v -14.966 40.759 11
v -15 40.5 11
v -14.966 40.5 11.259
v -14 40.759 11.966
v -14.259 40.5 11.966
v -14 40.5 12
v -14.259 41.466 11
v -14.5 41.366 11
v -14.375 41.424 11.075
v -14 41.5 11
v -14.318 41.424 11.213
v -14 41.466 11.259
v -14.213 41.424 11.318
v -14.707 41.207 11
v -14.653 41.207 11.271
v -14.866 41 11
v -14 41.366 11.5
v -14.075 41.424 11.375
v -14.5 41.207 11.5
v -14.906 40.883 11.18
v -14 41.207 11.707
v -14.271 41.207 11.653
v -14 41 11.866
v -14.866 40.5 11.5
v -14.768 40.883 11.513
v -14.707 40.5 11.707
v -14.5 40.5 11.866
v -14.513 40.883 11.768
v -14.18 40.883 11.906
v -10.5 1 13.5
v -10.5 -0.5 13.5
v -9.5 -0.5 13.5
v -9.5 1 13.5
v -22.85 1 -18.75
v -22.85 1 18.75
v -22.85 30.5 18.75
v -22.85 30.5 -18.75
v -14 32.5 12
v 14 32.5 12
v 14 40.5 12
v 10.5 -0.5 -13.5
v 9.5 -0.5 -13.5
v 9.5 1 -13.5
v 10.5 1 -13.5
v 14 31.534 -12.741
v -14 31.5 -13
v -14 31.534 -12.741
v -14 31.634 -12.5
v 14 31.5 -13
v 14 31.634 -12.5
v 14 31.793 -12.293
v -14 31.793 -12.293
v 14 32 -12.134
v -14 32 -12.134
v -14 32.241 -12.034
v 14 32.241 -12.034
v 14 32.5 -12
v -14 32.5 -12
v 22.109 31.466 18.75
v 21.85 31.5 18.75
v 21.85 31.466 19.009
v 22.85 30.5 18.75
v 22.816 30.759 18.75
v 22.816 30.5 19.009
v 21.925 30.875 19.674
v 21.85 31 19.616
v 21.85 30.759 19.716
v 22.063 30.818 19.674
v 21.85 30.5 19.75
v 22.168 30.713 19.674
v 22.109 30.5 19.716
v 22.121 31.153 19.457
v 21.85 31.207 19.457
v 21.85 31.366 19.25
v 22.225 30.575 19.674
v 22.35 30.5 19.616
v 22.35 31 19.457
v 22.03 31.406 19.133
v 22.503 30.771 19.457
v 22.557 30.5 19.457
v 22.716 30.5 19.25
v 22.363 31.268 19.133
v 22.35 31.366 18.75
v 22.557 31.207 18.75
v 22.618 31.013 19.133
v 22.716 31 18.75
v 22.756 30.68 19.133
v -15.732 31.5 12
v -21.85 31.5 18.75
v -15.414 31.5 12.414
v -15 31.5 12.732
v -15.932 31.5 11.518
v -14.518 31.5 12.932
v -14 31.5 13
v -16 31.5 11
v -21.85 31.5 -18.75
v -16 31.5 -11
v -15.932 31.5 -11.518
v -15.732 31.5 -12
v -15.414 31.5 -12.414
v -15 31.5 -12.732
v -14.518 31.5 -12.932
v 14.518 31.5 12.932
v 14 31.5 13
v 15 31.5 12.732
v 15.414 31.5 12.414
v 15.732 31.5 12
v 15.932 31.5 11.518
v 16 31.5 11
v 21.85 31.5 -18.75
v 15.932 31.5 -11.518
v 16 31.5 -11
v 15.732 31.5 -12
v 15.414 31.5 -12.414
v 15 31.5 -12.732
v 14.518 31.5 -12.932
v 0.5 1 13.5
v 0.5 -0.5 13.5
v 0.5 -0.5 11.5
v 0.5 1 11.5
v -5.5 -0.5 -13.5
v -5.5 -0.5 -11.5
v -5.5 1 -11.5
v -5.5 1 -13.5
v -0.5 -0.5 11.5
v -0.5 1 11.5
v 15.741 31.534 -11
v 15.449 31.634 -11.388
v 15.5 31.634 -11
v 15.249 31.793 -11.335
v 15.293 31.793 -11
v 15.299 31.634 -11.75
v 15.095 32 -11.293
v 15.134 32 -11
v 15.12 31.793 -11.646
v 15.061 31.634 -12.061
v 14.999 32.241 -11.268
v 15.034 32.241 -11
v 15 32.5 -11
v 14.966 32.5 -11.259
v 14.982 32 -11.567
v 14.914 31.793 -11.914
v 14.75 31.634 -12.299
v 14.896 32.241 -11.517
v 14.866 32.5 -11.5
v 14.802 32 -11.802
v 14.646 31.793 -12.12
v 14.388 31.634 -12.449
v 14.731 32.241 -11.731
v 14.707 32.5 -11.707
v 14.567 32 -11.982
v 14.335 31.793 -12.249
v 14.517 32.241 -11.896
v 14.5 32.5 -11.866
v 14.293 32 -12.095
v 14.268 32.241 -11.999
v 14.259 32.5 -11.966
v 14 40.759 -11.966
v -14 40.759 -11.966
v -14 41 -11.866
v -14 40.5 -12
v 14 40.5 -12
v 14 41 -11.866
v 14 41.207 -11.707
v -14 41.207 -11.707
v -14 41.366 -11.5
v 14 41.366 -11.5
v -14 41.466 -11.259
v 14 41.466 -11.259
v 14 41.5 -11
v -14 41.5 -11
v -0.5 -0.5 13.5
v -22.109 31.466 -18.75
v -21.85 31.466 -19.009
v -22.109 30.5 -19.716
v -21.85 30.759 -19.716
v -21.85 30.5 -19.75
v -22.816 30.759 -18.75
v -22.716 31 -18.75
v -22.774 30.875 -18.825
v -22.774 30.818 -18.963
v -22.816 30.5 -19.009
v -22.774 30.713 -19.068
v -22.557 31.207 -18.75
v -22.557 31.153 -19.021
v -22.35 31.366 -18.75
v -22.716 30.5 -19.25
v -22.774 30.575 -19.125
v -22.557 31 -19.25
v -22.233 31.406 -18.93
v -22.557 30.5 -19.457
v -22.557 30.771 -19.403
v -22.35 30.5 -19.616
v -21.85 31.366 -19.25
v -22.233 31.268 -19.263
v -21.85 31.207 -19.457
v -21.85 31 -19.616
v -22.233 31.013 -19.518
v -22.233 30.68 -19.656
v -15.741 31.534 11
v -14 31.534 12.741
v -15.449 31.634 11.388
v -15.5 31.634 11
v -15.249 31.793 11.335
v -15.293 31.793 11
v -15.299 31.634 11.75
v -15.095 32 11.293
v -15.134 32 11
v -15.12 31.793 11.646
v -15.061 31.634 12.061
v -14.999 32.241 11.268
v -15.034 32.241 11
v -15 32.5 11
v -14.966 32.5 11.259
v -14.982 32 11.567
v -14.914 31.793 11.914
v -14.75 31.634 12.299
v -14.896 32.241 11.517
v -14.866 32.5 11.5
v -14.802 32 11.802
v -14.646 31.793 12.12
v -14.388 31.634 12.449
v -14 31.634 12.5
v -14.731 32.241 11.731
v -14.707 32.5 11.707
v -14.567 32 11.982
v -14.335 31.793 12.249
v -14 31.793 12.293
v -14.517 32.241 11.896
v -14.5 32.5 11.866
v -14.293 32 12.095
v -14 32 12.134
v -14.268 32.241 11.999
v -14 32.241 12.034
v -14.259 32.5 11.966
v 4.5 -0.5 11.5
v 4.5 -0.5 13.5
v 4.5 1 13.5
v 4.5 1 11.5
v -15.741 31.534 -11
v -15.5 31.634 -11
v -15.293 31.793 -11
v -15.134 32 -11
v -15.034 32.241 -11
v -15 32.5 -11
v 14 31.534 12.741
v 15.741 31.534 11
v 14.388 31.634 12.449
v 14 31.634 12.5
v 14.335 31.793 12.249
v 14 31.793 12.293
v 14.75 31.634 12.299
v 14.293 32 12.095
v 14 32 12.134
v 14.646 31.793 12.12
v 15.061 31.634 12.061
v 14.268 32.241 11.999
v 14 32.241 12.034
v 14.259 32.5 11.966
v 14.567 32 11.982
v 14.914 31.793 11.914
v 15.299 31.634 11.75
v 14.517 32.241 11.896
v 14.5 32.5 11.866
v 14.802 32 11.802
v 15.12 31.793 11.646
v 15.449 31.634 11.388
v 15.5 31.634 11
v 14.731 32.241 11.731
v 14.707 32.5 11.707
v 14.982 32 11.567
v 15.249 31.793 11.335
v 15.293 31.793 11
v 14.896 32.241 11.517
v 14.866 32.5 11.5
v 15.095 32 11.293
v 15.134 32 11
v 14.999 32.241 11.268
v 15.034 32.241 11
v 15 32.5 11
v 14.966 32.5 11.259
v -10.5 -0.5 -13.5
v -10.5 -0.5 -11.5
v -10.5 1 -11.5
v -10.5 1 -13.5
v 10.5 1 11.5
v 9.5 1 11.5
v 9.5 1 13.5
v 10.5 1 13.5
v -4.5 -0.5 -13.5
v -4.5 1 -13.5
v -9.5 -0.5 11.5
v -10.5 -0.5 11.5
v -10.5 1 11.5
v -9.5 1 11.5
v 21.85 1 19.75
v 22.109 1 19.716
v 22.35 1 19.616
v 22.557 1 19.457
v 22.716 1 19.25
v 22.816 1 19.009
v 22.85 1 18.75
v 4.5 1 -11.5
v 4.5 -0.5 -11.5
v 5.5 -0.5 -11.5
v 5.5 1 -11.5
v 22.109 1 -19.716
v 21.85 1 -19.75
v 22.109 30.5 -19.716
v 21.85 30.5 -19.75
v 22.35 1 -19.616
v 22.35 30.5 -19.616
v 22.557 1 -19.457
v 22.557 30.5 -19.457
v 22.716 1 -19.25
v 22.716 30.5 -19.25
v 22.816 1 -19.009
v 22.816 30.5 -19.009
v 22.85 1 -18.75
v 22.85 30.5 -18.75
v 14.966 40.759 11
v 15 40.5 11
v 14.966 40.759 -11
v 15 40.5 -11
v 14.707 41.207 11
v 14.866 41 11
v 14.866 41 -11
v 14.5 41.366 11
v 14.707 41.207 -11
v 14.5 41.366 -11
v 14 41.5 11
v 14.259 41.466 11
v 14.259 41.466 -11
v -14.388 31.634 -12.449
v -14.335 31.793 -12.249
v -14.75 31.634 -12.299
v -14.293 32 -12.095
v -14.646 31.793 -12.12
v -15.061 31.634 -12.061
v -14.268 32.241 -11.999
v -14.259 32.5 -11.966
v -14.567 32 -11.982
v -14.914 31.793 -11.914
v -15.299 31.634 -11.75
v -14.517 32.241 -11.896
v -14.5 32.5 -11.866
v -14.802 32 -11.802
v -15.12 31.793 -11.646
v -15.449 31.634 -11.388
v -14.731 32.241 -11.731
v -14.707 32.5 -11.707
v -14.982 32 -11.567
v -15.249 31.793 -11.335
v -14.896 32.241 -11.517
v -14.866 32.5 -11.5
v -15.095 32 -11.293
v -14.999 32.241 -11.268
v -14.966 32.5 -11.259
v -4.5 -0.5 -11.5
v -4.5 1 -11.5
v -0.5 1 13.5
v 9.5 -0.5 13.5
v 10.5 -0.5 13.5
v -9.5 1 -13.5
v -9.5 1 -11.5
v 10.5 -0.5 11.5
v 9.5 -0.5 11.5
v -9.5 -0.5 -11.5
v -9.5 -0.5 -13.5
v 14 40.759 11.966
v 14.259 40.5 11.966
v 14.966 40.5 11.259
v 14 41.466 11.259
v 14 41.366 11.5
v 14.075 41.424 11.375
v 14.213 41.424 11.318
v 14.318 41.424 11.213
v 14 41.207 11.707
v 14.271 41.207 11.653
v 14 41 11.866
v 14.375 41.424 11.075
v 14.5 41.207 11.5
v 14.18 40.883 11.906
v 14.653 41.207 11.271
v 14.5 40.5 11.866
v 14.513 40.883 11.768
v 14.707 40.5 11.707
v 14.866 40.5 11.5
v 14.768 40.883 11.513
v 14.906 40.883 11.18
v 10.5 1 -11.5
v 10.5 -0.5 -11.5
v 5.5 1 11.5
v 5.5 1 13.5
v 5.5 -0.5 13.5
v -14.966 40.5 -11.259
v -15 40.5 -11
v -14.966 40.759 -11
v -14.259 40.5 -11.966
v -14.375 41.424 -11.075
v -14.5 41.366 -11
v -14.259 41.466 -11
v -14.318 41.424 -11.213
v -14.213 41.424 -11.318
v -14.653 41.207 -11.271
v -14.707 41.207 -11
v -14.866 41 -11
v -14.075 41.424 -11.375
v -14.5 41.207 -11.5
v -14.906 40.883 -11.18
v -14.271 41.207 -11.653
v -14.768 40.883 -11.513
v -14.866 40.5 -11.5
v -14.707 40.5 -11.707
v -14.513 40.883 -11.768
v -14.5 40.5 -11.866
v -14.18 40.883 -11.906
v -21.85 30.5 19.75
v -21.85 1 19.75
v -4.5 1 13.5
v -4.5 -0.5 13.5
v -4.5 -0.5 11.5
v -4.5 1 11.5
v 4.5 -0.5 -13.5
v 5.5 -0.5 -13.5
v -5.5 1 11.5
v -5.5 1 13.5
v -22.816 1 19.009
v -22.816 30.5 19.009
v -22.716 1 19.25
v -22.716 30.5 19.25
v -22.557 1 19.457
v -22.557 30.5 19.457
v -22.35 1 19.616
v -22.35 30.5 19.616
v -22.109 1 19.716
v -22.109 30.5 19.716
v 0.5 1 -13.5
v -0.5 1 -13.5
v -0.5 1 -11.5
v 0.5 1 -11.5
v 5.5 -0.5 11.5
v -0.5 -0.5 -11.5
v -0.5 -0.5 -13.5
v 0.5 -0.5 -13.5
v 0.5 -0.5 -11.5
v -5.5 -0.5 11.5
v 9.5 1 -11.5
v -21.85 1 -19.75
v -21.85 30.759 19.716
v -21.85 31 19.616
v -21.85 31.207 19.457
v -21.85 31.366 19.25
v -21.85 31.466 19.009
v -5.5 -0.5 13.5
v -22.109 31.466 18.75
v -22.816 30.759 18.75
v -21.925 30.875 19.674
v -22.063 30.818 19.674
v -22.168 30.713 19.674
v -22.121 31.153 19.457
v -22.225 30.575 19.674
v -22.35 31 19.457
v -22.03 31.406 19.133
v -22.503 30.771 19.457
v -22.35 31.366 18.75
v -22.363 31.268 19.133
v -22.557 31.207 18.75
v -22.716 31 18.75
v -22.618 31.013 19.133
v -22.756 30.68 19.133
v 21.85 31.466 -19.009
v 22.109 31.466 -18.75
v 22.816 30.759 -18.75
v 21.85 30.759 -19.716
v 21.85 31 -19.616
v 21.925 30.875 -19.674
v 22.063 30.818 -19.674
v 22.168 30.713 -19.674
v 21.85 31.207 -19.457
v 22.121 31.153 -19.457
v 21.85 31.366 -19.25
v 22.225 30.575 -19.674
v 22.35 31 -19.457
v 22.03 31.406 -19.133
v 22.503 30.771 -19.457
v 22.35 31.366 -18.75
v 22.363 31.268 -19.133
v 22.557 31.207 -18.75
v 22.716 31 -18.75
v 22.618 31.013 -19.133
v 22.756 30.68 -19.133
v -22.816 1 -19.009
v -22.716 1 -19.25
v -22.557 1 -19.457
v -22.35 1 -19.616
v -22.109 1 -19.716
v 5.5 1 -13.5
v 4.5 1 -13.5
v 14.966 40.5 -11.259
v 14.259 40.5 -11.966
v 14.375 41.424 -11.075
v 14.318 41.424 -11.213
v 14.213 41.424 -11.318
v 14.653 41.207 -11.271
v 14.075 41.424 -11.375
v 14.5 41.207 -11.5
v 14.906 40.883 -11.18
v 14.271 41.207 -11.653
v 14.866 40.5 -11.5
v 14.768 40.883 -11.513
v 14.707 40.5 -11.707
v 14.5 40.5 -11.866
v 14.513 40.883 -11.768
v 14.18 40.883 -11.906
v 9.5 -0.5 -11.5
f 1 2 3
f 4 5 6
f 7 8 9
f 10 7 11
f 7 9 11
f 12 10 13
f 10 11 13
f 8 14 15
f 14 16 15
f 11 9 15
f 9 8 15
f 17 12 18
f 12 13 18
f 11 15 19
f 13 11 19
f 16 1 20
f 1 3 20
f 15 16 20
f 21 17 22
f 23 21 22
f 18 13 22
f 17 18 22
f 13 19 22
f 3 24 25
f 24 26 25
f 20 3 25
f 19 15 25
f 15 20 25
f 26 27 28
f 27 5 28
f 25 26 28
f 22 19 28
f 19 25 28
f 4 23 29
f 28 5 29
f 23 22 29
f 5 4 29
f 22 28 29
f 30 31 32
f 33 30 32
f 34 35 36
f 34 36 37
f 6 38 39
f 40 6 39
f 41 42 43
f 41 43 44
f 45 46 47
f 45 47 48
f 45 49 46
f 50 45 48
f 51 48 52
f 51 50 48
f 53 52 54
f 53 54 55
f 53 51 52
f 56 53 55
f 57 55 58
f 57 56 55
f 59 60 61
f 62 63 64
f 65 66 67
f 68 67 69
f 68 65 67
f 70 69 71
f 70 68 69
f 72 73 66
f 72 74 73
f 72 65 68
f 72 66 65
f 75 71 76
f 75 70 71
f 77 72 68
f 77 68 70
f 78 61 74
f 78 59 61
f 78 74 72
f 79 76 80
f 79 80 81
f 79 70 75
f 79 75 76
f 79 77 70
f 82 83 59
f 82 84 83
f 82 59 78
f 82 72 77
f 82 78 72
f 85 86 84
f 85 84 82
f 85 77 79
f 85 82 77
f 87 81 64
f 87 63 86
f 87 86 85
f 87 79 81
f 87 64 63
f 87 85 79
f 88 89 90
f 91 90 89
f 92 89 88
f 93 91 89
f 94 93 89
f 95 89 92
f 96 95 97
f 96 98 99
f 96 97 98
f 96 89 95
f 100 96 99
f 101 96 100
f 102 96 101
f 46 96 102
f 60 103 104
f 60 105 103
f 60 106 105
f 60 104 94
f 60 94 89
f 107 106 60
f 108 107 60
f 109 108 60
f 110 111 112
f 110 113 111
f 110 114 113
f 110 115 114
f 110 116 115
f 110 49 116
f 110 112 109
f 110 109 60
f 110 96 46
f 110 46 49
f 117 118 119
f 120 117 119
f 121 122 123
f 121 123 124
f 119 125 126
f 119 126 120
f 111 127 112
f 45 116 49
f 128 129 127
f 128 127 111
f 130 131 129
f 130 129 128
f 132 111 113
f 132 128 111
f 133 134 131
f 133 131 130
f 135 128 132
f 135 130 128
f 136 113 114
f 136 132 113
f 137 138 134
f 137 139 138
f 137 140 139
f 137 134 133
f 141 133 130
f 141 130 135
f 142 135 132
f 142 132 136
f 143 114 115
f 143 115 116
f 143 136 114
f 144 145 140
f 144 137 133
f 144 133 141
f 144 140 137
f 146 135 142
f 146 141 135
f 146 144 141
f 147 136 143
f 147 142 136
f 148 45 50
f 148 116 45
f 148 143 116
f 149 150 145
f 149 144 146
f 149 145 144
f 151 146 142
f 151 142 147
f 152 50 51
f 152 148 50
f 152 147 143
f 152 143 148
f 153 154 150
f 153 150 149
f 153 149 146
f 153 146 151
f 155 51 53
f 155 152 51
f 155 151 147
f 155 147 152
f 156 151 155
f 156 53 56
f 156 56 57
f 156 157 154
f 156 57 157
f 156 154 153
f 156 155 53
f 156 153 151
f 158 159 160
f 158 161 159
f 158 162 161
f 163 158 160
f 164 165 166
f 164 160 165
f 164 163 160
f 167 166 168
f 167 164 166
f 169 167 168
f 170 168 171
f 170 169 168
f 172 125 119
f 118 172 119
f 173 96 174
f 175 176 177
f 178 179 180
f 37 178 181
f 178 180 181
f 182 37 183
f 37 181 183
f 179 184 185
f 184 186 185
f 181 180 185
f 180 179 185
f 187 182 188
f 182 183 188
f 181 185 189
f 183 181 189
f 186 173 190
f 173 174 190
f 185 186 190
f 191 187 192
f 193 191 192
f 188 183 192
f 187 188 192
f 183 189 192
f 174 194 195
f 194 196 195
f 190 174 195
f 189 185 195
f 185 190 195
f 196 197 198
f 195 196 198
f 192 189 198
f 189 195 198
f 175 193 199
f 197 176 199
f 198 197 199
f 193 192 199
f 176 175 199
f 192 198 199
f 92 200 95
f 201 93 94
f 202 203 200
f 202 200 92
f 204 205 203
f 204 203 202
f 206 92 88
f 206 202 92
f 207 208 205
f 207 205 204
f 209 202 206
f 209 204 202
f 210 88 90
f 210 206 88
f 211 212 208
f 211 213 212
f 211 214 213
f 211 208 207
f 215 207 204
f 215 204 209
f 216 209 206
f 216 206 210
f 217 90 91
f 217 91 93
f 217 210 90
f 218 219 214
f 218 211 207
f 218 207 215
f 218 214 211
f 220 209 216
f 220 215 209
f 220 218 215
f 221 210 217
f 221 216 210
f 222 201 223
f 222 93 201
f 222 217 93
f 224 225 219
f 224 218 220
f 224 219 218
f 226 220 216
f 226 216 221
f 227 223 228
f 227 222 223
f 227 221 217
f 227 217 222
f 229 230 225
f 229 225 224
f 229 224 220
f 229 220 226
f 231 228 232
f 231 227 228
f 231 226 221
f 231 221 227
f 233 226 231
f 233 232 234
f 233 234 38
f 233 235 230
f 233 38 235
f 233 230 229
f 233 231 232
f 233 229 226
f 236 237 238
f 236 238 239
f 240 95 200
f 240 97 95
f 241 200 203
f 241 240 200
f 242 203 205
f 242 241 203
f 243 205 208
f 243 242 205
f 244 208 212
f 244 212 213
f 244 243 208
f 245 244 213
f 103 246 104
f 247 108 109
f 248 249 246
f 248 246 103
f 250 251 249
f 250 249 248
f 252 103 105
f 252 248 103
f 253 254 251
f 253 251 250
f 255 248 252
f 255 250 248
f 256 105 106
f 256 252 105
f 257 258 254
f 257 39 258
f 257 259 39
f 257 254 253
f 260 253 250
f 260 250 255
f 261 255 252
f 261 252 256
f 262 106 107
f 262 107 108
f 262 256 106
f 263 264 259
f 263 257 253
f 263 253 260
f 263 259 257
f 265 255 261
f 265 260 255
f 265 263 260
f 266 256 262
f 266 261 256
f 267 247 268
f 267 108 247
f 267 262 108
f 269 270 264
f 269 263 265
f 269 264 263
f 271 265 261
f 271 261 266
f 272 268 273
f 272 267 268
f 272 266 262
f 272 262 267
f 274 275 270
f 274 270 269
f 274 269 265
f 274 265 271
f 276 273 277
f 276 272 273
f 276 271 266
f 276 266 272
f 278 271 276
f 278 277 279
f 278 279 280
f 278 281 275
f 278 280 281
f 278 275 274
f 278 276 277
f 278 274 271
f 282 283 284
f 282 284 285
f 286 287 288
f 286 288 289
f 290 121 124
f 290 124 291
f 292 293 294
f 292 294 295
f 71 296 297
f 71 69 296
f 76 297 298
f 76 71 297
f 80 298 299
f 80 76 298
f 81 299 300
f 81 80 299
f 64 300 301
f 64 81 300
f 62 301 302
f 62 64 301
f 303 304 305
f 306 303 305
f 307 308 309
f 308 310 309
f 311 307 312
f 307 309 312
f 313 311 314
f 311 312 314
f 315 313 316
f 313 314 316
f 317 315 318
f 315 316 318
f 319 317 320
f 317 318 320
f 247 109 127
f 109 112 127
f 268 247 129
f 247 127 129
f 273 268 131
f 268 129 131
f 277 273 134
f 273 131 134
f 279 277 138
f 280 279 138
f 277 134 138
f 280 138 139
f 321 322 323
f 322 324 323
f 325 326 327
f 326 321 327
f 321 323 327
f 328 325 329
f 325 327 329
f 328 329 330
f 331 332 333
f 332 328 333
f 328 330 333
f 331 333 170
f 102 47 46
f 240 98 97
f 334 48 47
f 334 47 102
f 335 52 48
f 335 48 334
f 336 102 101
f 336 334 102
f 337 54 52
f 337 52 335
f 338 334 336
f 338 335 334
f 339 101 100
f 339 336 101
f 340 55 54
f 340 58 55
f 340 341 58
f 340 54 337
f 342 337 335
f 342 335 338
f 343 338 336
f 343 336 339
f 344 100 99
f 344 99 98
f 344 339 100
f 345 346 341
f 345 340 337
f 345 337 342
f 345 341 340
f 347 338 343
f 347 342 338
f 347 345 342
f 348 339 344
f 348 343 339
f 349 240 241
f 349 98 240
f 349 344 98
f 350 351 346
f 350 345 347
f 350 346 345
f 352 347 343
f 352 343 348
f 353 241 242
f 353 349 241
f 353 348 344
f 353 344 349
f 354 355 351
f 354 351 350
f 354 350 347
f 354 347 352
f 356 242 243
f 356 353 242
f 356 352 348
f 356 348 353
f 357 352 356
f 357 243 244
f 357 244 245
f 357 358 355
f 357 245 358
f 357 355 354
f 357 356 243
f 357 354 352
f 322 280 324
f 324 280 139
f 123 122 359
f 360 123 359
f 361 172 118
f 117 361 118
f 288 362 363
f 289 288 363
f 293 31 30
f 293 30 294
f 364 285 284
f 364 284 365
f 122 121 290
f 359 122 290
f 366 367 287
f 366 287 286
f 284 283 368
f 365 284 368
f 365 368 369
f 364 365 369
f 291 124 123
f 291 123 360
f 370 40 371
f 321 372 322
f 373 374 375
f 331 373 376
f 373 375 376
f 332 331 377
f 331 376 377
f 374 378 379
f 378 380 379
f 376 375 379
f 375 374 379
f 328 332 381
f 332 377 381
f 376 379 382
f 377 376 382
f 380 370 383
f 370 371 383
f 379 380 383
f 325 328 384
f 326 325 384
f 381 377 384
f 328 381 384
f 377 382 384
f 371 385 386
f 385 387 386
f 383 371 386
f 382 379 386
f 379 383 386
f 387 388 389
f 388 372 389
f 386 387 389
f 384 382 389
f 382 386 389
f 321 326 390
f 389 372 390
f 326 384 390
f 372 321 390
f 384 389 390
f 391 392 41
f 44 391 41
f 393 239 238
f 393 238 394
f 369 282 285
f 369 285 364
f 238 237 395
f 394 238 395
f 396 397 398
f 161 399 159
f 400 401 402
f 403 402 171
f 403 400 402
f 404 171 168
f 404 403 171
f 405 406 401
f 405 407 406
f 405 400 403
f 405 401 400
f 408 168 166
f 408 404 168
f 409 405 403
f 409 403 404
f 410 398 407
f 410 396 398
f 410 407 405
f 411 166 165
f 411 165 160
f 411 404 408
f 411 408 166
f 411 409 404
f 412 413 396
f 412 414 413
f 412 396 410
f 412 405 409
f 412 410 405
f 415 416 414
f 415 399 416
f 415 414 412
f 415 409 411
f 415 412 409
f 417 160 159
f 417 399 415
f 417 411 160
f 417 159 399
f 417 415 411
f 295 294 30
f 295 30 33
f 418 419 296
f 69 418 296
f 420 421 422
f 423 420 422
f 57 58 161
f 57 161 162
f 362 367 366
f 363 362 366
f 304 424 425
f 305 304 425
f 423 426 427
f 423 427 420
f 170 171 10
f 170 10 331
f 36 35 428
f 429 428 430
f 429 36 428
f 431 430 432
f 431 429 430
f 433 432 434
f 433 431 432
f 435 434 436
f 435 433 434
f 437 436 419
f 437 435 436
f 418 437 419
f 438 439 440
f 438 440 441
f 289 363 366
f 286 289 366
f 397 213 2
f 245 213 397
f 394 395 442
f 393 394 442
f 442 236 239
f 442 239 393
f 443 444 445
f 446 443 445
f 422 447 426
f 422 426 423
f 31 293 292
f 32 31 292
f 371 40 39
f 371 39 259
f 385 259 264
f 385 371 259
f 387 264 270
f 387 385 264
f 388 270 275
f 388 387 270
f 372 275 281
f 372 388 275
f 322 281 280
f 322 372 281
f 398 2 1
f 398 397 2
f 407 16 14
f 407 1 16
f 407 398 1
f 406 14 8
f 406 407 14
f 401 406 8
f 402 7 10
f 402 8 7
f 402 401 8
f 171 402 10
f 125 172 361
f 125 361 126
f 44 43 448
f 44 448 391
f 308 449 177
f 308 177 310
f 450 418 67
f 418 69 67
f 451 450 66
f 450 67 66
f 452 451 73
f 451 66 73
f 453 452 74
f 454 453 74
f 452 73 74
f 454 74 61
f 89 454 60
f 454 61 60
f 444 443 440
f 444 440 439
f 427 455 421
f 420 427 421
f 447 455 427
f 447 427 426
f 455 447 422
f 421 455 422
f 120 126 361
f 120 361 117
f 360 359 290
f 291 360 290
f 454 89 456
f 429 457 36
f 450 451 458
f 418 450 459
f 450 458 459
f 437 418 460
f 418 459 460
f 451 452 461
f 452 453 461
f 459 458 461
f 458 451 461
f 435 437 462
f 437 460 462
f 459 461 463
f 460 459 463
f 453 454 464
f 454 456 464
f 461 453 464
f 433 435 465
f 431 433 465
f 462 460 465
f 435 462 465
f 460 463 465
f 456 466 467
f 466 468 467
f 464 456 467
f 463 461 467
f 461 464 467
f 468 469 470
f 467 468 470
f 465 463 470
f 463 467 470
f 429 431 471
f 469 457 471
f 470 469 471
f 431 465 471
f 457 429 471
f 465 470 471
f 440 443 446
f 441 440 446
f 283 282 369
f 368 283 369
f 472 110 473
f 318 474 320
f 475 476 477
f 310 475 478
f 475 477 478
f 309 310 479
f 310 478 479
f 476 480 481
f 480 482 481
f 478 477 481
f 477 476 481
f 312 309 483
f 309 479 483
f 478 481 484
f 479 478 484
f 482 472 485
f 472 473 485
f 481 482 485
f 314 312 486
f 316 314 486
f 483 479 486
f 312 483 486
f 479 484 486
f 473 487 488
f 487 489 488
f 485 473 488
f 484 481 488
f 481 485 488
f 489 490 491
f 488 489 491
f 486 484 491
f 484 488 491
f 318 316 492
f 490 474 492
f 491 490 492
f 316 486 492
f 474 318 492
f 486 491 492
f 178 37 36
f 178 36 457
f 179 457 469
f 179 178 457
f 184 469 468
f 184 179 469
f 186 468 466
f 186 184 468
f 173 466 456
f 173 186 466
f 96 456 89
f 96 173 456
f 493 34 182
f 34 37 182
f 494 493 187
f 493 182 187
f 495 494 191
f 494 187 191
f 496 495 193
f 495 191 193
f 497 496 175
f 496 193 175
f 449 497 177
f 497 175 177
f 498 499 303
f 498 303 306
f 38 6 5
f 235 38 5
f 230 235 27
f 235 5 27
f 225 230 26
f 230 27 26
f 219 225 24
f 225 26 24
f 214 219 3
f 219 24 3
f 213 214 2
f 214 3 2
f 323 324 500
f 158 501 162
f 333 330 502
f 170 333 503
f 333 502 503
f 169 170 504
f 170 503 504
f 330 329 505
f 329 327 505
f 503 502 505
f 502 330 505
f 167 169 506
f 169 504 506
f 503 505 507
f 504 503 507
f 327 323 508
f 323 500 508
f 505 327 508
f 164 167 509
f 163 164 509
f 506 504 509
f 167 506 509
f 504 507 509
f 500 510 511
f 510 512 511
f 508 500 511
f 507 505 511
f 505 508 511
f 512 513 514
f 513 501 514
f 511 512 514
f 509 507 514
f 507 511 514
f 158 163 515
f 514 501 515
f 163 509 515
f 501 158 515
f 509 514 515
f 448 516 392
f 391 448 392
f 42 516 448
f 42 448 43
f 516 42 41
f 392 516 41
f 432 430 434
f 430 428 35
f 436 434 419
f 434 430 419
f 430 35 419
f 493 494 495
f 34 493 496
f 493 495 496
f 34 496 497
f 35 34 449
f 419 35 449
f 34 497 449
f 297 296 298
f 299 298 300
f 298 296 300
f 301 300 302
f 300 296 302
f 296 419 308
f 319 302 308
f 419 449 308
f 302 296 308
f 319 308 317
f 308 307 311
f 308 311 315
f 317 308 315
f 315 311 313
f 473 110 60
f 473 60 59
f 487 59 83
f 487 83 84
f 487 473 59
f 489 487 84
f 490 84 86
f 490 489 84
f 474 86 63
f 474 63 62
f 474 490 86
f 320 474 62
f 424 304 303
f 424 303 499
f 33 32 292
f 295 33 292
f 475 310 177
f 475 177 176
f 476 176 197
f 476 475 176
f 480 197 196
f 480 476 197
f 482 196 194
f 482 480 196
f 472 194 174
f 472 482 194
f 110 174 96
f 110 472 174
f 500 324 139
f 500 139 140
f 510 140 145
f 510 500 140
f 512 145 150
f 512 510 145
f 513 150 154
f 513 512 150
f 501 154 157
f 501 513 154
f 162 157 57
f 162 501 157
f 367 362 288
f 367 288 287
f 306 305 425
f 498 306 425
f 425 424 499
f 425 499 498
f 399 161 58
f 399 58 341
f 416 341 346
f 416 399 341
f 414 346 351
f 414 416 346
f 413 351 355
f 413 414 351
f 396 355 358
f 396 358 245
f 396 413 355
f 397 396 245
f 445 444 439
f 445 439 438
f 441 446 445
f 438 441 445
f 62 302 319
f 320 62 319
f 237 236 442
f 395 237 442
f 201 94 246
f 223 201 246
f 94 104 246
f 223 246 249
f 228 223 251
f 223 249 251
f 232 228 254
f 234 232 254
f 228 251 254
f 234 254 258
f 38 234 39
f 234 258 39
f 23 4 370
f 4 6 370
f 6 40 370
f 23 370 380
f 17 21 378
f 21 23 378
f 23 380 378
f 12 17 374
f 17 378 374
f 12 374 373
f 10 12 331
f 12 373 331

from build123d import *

# Parameters (mm, degrees)
EXTRUDE_START      = -0.5
SKETCH_1_W         = 1
SKETCH_1_H         = 2
EXTRUDE_1_DEPTH    = 1.5
EXTRUDE_1_2_DEPTH  = 1.5
EXTRUDE_1_3_DEPTH  = 1.5
EXTRUDE_1_4_DEPTH  = 1.5
EXTRUDE_1_5_DEPTH  = 1.5
EXTRUDE_1_6_DEPTH  = 1.5
EXTRUDE_1_7_DEPTH  = 1.5
EXTRUDE_1_8_DEPTH  = 1.5
EXTRUDE_1_9_DEPTH  = 1.5
EXTRUDE_1_10_DEPTH = 1.5
SKETCH_2_W         = 45.7
SKETCH_2_H         = 39.5
EXTRUDE_2_DEPTH    = 30.5
SKETCH_3_W         = 30
SKETCH_3_H         = 24
EXTRUDE_3_DEPTH    = 10
FILLET_1_R         = 1


with BuildPart() as part:
    # Эскиз1 → Бобышка-Вытянуть1 (new body)
    with BuildSketch(Plane(origin=(0, 0, 0), x_dir=(1, 0, 0), z_dir=(0, 1, 0)).offset(EXTRUDE_START)):
        with Locations((-5, 12.5)):
            Rectangle(SKETCH_1_W, SKETCH_1_H)
    extrude(amount=EXTRUDE_1_DEPTH)


with BuildPart() as body_2:
    # Эскиз1 → Extrude 1 2 (new body)
    with BuildSketch(Plane(origin=(0, 0, 0), x_dir=(1, 0, 0), z_dir=(0, 1, 0)).offset(EXTRUDE_START)):
        with Locations((-10, 12.5)):
            Rectangle(SKETCH_1_W, SKETCH_1_H)
    extrude(amount=EXTRUDE_1_2_DEPTH)


with BuildPart() as body_3:
    # Эскиз1 → Extrude 1 3 (new body)
    with BuildSketch(Plane(origin=(0, 0, 0), x_dir=(1, 0, 0), z_dir=(0, 1, 0)).offset(EXTRUDE_START)):
        with Locations((0, 12.5)):
            Rectangle(SKETCH_1_W, SKETCH_1_H)
    extrude(amount=EXTRUDE_1_3_DEPTH)


with BuildPart() as body_4:
    # Эскиз1 → Extrude 1 4 (new body)
    with BuildSketch(Plane(origin=(0, 0, 0), x_dir=(1, 0, 0), z_dir=(0, 1, 0)).offset(EXTRUDE_START)):
        with Locations((5, 12.5)):
            Rectangle(SKETCH_1_W, SKETCH_1_H)
    extrude(amount=EXTRUDE_1_4_DEPTH)


with BuildPart() as body_5:
    # Эскиз1 → Extrude 1 5 (new body)
    with BuildSketch(Plane(origin=(0, 0, 0), x_dir=(1, 0, 0), z_dir=(0, 1, 0)).offset(EXTRUDE_START)):
        with Locations((10, 12.5)):
            Rectangle(SKETCH_1_W, SKETCH_1_H)
    extrude(amount=EXTRUDE_1_5_DEPTH)


with BuildPart() as body_6:
    # Эскиз1 → Extrude 1 6 (new body)
    with BuildSketch(Plane(origin=(0, 0, 0), x_dir=(1, 0, 0), z_dir=(0, 1, 0)).offset(EXTRUDE_START)):
        with Locations((-5, -12.5)):
            Rectangle(SKETCH_1_W, SKETCH_1_H)
    extrude(amount=EXTRUDE_1_6_DEPTH)


with BuildPart() as body_7:
    # Эскиз1 → Extrude 1 7 (new body)
    with BuildSketch(Plane(origin=(0, 0, 0), x_dir=(1, 0, 0), z_dir=(0, 1, 0)).offset(EXTRUDE_START)):
        with Locations((0, -12.5)):
            Rectangle(SKETCH_1_W, SKETCH_1_H)
    extrude(amount=EXTRUDE_1_7_DEPTH)


with BuildPart() as body_8:
    # Эскиз1 → Extrude 1 8 (new body)
    with BuildSketch(Plane(origin=(0, 0, 0), x_dir=(1, 0, 0), z_dir=(0, 1, 0)).offset(EXTRUDE_START)):
        with Locations((5, -12.5)):
            Rectangle(SKETCH_1_W, SKETCH_1_H)
    extrude(amount=EXTRUDE_1_8_DEPTH)


with BuildPart() as body_9:
    # Эскиз1 → Extrude 1 9 (new body)
    with BuildSketch(Plane(origin=(0, 0, 0), x_dir=(1, 0, 0), z_dir=(0, 1, 0)).offset(EXTRUDE_START)):
        with Locations((10, -12.5)):
            Rectangle(SKETCH_1_W, SKETCH_1_H)
    extrude(amount=EXTRUDE_1_9_DEPTH)


with BuildPart() as body_10:
    # Эскиз1 → Extrude 1 10 (new body)
    with BuildSketch(Plane(origin=(0, 0, 0), x_dir=(1, 0, 0), z_dir=(0, 1, 0)).offset(EXTRUDE_START)):
        with Locations((-10, -12.5)):
            Rectangle(SKETCH_1_W, SKETCH_1_H)
    extrude(amount=EXTRUDE_1_10_DEPTH)


with BuildPart() as body_11:
    # Эскиз2 → Бобышка-Вытянуть2 (new body)
    with BuildSketch(Plane(origin=(0, 1, 0), x_dir=(1, 0, 0), z_dir=(0, 1, 0))):
        Rectangle(SKETCH_2_W, SKETCH_2_H)
    extrude(amount=EXTRUDE_2_DEPTH)

    # Эскиз3 → Бобышка-Вытянуть3 (add)
    with BuildSketch(Plane(origin=(0, 31.5, 0), x_dir=(1, 0, 0), z_dir=(0, 1, 0))):
        Rectangle(SKETCH_3_W, SKETCH_3_H)
    extrude(amount=EXTRUDE_3_DEPTH)

    # Скругление1
    fillet_1_edges = [body_11.edges().sort_by_distance(p)[0] for p in [
        (22.85, 31.5, 0),
        (0, 31.5, -19.75),
        (-15, 31.5, 0),
        (-15, 36.5, -12),
        (0, 31.5, 12),
        (-15, 36.5, 12),
        (15, 31.5, 0),
        (15, 36.5, 12),
        (0, 31.5, -12),
        (15, 36.5, -12),
        (-15, 41.5, 0),
        (0, 41.5, 12),
        (15, 41.5, 0),
        (0, 41.5, -12),
        (-22.85, 31.5, 0),
        (0, 31.5, 19.75),
        (-22.85, 16.25, -19.75),
        (22.85, 16.25, -19.75),
        (22.85, 16.25, 19.75),
        (-22.85, 16.25, 19.75),
    ]]
    fillet(fillet_1_edges, radius=FILLET_1_R)


solid = Compound([part.part, body_2.part, body_3.part, body_4.part, body_5.part, body_6.part, body_7.part, body_8.part, body_9.part, body_10.part, body_11.part])
